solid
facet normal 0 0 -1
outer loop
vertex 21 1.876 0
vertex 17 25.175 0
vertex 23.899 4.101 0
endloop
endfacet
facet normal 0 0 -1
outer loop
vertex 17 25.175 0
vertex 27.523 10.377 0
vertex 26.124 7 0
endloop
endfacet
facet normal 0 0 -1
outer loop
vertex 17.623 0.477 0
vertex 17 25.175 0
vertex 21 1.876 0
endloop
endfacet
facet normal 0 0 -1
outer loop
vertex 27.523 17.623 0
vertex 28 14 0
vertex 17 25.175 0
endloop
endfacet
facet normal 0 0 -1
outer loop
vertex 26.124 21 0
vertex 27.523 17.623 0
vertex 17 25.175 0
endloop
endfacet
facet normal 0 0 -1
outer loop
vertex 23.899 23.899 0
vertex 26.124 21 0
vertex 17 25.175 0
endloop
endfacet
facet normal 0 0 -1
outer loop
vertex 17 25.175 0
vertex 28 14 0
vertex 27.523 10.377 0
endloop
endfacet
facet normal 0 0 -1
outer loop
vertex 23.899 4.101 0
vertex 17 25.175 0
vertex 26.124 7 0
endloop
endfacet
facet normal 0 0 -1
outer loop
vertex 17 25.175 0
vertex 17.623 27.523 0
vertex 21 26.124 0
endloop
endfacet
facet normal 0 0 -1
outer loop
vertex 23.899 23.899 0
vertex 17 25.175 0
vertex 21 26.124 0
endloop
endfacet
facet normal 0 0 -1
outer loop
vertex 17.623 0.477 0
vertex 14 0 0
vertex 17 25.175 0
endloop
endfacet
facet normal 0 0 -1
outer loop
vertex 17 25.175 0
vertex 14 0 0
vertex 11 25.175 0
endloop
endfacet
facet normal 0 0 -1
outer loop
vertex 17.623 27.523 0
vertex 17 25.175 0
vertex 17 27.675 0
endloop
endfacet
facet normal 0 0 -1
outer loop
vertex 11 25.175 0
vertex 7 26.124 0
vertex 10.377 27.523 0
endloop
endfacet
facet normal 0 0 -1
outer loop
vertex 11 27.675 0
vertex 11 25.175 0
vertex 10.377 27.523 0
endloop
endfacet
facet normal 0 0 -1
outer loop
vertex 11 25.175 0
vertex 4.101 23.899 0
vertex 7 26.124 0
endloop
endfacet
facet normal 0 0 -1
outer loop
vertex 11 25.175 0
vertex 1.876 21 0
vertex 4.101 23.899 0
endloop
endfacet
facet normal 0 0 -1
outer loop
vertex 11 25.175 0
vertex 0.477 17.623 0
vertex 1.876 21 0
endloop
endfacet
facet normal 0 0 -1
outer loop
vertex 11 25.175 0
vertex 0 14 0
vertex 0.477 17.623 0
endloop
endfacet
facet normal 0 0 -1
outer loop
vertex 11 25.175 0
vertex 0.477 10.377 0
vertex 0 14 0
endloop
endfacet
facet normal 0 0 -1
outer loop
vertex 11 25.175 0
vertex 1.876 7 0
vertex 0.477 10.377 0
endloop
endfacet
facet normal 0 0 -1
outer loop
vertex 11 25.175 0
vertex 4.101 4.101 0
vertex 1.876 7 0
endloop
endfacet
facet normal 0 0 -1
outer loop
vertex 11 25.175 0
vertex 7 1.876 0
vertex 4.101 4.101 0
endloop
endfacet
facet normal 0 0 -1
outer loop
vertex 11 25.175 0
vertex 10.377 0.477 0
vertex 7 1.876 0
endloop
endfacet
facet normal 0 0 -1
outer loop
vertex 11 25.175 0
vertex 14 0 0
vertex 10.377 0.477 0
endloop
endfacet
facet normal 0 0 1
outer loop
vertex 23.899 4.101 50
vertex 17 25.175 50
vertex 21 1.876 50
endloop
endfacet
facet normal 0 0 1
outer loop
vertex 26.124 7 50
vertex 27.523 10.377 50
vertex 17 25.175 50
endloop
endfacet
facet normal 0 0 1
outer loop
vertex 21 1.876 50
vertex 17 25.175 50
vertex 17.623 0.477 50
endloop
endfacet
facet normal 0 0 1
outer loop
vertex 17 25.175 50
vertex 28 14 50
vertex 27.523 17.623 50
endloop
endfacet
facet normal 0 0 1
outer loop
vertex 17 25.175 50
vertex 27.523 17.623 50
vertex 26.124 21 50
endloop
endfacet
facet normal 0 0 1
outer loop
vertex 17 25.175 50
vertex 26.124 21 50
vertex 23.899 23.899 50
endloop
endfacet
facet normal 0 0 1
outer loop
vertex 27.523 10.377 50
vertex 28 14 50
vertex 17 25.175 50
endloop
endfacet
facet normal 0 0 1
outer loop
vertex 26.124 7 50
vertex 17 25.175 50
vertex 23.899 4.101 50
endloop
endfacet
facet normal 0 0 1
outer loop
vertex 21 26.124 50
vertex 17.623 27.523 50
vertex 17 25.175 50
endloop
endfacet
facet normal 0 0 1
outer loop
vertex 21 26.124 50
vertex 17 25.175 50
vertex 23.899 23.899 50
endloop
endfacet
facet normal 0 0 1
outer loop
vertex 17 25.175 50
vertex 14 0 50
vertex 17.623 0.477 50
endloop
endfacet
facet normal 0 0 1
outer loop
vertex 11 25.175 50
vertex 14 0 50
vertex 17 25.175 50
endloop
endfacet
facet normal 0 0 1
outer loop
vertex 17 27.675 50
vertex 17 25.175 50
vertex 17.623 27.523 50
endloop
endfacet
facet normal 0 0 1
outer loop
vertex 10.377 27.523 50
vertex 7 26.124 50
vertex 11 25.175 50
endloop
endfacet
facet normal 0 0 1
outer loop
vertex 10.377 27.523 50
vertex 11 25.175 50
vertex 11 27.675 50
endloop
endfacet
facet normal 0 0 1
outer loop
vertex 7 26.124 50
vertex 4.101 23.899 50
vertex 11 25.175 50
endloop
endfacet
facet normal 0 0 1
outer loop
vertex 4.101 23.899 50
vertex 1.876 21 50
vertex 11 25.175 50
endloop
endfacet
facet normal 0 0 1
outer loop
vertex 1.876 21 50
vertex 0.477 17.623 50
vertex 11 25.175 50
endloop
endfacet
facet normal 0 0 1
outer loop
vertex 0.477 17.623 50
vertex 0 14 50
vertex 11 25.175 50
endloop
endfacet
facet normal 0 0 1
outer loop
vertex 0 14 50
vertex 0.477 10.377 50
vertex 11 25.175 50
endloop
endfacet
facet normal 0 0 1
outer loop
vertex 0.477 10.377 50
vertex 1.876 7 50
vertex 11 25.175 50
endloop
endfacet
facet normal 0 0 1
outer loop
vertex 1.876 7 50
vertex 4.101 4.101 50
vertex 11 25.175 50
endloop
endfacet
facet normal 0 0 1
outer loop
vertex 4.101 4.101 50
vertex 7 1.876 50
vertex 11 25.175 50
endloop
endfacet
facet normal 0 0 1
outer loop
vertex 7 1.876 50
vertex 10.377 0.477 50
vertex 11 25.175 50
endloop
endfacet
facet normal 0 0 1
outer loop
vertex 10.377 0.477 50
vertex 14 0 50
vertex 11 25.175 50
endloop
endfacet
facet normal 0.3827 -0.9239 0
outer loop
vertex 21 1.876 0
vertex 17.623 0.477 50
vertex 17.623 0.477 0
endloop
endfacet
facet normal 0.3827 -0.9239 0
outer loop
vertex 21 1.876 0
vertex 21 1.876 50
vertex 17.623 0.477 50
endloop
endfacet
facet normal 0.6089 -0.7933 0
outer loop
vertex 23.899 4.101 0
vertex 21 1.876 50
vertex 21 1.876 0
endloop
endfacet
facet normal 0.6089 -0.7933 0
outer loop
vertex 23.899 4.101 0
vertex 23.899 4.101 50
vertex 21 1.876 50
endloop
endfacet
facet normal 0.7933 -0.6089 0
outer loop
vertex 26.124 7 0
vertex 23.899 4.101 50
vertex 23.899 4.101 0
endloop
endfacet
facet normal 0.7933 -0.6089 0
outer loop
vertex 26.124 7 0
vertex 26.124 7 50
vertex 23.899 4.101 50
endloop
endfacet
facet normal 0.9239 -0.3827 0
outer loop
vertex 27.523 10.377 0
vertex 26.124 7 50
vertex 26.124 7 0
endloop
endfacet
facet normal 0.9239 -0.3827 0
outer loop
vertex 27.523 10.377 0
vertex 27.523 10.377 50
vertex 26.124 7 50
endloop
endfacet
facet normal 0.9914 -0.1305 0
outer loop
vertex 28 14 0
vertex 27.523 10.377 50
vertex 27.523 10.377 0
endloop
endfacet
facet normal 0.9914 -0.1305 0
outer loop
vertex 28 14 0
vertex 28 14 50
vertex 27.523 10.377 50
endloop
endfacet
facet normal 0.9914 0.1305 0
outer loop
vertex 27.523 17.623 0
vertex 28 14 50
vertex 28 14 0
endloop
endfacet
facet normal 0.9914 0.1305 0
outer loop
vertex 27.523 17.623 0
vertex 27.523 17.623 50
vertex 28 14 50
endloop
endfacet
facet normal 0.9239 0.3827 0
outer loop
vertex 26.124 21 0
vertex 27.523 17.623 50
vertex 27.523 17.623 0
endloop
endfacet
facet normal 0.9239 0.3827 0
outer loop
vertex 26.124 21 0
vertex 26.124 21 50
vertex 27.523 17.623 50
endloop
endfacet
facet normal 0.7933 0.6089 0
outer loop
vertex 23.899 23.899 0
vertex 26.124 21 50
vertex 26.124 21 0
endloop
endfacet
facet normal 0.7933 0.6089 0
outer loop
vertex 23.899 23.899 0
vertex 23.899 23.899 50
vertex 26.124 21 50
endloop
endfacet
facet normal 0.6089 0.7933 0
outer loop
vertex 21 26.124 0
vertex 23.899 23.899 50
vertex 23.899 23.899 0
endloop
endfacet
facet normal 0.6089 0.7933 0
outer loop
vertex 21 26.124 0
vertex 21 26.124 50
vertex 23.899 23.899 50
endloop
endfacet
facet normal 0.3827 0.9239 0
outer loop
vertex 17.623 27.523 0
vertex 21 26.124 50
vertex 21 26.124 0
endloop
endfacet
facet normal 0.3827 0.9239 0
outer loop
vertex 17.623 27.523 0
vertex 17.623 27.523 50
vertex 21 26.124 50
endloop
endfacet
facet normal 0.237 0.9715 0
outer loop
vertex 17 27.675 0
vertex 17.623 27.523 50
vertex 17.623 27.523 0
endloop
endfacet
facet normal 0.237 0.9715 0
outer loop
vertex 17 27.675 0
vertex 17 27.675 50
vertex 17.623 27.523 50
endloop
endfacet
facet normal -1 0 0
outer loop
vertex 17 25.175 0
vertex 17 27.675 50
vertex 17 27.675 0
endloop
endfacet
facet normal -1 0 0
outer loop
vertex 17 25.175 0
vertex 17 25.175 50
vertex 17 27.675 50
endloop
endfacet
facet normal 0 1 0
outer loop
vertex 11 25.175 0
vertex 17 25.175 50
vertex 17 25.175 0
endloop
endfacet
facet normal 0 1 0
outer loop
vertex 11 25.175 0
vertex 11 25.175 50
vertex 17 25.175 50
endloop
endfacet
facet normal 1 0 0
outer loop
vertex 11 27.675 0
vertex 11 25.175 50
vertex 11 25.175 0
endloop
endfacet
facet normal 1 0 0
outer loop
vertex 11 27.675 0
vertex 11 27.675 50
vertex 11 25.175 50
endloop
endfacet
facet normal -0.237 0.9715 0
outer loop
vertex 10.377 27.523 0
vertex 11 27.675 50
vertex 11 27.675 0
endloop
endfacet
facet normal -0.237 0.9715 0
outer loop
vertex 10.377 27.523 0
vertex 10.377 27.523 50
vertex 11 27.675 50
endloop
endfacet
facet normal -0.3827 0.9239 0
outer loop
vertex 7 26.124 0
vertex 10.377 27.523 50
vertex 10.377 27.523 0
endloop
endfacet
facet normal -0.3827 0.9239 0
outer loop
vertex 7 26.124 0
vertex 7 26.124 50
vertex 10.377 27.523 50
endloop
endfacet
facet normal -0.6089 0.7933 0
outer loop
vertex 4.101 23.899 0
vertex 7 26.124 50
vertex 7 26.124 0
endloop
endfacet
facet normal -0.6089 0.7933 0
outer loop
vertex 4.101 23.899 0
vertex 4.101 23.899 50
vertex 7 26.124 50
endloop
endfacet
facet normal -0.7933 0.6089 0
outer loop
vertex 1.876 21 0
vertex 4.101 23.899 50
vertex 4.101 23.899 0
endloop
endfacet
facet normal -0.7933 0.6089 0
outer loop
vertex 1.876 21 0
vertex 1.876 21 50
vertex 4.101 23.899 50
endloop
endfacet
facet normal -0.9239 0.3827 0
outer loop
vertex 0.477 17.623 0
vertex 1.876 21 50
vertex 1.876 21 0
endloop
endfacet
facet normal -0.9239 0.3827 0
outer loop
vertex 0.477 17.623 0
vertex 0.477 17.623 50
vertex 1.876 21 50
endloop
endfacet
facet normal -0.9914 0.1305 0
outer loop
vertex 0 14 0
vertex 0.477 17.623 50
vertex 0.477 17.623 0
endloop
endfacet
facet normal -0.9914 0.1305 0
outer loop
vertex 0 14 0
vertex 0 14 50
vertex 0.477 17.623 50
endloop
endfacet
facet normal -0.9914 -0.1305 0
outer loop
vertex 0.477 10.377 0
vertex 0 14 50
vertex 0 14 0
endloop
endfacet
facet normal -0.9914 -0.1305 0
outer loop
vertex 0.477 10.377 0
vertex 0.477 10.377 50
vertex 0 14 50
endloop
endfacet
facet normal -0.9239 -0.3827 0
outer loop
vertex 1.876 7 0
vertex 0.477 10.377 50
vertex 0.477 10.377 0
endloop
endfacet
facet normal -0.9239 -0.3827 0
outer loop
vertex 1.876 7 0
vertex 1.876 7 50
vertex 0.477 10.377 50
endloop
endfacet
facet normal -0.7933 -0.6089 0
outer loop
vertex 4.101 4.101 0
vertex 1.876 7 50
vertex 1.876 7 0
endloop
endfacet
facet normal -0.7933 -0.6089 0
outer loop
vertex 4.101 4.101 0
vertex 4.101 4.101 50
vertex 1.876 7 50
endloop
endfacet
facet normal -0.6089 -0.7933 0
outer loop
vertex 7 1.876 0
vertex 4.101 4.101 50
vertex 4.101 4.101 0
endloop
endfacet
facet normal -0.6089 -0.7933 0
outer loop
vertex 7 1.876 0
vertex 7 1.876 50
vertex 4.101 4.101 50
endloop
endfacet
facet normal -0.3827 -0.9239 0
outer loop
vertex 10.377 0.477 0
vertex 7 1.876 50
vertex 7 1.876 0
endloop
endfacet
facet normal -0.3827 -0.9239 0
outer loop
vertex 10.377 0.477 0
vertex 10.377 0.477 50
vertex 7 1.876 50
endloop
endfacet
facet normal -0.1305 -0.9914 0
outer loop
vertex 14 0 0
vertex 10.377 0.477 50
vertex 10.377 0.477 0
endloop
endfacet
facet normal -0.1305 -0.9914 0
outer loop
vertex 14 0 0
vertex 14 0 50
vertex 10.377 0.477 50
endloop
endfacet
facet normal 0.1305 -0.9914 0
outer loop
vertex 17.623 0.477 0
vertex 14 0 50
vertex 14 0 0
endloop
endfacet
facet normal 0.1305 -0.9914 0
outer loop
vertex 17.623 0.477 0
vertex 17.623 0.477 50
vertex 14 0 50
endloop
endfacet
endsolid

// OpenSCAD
$fn = 32;

// ----------------------------------------------------------------------
// Keyway shaft: d28 shaft, key 6 x 2.5 mm
// ----------------------------------------------------------------------

// --- parameters (mm) ---
shaft_r = 14;             // shaft radius
key_w = 6;                // keyway width
key_d = 2.5;              // keyway depth below the surface line
plate_t = 50;             // shaft length, Z (extrusion height)

shaft_d = 2 * shaft_r;  // shaft diameter
circle_step = 15;  // polygon sampling step, degrees

profile = [[10.377, 27.523], [7, 26.124], [4.101, 23.899], [1.876, 21], [0.477, 17.623], [0, 14], [0.477, 10.377], [1.876, 7], [4.101, 4.101], [7, 1.876], [10.377, 0.477], [14, 0], [17.623, 0.477], [21, 1.876], [23.899, 4.101], [26.124, 7], [27.523, 10.377], [28, 14], [27.523, 17.623], [26.124, 21], [23.899, 23.899], [21, 26.124], [17.623, 27.523], [17, 27.675], [17, 25.175], [11, 25.175], [11, 27.675]];  // primary outline, 27 points, counter clockwise

// --- the one profile operation ---
linear_extrude(height = plate_t) polygon(points = profile);
